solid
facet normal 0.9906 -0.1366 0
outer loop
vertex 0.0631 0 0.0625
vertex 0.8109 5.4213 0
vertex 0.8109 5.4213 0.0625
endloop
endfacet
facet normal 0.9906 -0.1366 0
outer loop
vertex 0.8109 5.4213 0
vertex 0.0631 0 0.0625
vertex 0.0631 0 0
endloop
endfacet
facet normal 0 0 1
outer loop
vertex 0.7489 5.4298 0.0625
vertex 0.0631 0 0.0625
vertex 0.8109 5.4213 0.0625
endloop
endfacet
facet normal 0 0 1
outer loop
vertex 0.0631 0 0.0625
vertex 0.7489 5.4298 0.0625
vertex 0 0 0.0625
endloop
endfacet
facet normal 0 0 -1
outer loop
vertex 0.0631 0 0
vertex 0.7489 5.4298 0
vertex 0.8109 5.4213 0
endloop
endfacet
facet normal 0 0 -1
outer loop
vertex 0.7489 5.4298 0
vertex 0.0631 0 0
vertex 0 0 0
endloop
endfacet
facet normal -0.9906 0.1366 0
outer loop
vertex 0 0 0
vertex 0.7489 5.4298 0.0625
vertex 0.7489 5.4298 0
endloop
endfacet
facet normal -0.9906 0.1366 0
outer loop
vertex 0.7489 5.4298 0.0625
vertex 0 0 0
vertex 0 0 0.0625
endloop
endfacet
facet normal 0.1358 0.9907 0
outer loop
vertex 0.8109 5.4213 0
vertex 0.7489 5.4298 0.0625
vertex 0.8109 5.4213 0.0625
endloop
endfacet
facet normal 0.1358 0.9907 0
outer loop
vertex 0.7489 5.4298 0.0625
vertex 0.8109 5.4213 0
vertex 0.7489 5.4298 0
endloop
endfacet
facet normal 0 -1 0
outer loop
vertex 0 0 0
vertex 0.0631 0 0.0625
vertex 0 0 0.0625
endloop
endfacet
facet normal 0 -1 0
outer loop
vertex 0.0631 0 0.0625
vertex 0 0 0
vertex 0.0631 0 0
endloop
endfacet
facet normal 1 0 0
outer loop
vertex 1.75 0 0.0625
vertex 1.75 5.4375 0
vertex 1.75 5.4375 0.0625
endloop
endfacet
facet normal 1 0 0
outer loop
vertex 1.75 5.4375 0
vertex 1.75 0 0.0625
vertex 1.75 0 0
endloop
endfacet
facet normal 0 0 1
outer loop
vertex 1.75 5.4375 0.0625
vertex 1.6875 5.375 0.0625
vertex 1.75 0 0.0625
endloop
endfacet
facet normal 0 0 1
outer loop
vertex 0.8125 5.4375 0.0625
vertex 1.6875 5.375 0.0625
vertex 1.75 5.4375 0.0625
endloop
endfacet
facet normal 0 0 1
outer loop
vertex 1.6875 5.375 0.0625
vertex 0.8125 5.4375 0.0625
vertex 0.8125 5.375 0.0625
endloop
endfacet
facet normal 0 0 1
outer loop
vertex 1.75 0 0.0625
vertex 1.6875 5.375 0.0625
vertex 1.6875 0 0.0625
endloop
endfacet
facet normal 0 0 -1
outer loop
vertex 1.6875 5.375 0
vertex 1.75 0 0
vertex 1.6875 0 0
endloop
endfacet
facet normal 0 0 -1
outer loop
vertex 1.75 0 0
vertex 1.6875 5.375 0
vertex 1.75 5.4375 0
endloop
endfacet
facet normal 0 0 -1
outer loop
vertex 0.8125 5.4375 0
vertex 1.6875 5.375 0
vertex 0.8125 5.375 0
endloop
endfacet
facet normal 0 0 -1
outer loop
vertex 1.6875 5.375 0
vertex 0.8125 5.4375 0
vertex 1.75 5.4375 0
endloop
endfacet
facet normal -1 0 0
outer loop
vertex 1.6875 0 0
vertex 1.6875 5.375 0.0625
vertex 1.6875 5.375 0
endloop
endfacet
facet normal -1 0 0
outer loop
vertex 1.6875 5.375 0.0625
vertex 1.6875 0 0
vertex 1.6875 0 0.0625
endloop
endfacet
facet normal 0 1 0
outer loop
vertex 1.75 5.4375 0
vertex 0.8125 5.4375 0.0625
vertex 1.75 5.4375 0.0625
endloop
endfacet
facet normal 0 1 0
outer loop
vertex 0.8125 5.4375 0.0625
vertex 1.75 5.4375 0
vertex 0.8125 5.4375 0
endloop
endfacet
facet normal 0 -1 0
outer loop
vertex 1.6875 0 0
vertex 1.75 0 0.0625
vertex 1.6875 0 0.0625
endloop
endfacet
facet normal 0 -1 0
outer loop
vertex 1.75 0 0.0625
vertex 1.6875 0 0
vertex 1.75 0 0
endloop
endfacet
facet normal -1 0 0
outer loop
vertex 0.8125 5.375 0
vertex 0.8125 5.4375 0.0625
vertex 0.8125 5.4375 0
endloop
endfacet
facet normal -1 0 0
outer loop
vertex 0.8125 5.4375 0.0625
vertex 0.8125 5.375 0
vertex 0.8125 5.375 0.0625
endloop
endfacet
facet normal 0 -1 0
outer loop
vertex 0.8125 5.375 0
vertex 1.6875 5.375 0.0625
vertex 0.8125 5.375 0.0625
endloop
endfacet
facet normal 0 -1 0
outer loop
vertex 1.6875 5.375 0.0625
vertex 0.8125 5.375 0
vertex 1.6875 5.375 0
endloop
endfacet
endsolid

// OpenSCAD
// file: ../wart_data.scad
//######################################
// A6 - class rule constraints

max_wing_area = 30;		// square inches
spar_size = 1/16;
min_rib_thickness = 1/32;
min_rib_height = 1/16;
max_motor_stick_length = 6;
max_prop_diameter = 6;
prop_blade_thickness = 1/32;	// flat
min_weight = 1.2;			        // grams

//##################################################
// paper tubes
pt_t = 1/64;
pt_id = 1/16;
pt_r = 1/32;
pt_h = 0.25;

//######################################
wing_center_chord = 2;
wing_center_span = 8;
wing_tip_chord = 1.75;
wing_tip_span = 3.75;
wing_rib_camber = 4;
wing_tip_dihedral = 7/16;
winglet_chord = 1.75;
winglet_span = 1.25;

//######################################
stab_center_chord = 1.75;
stab_tip_chord = 1;
stab_span = 10 + 14/16;
stab_camber = 2;
stab_tip_dihedral = 7/8;

//######################################
fin_radius = 2;

//######################################
ms_length = max_motor_stick_length;
ms_front_height = 0.160;
ms_height = 0.190;
ms_rear_height = 0.160;
ms_front_post = 1.25;
ms_thickness = 0.070;
wing_post_height = 7/8;

// motor stick polygon
ms_x0 = 0.0;
ms_x1 = ms_length;
ms_x2 = ms_length;
ms_x3 = ms_front_post + wing_center_chord + 2 * (pt_r + pt_t);
ms_x4 = ms_front_post + pt_r + pt_t;
ms_x5 = 0.25;
ms_x6 = 0.0;

ms_y = ms_thickness;

ms_z0 = 0.0;
ms_z1 = 0.0;
ms_z2 = ms_rear_height;
ms_z3 = ms_height;
ms_z4 = ms_height;
ms_z5 = 0.18;
ms_z6 = ms_front_height;

ms_poly = [
    [ms_x0, ms_z0],
    [ms_x1, ms_z1],
    [ms_x2, ms_z2],
    [ms_x3, ms_z3],
    [ms_x4, ms_z4],
    [ms_x5, ms_z5],
    [ms_x6, ms_z6],
];

//######################################
tail_boom_length = 8.5;
tail_boom_front_height = 1/8;
tail_boom_thickness = 1/16;
tail_boom_rear_height = 1/16;
tail_boom_overlap = 0.5;
tail_boom_elevation = ms_rear_height + 3/16;
tb_overlap = 0.25;
// main file
include <../wart_data.scad>

module stab_panel() {
  le_angle = atan2(0.75,   stab_span/2);
  tip_rib_offset = stab_span/2*tan(le_angle);

  //leading edge
  difference() {
    rotate([0,0,-le_angle])
      translate([0,-0.5,0])
        cube([spar_size, stab_span/2 * 1.1, spar_size]);
    translate([-0.5,-1,-0.5])
      cube([3,1,1]);
    translate([0,stab_span/2,-0.5])
      cube([2,1,1]);
  }

  // trailing edge
  translate([stab_center_chord - spar_size,0,0])
    cube([spar_size, stab_span/2, spar_size]);

  // tip spar
  translate([spar_size+tip_rib_offset, stab_span/2-spar_size,0])
  cube([stab_tip_chord-2 * spar_size,spar_size, spar_size]);
}

stab_panel();
